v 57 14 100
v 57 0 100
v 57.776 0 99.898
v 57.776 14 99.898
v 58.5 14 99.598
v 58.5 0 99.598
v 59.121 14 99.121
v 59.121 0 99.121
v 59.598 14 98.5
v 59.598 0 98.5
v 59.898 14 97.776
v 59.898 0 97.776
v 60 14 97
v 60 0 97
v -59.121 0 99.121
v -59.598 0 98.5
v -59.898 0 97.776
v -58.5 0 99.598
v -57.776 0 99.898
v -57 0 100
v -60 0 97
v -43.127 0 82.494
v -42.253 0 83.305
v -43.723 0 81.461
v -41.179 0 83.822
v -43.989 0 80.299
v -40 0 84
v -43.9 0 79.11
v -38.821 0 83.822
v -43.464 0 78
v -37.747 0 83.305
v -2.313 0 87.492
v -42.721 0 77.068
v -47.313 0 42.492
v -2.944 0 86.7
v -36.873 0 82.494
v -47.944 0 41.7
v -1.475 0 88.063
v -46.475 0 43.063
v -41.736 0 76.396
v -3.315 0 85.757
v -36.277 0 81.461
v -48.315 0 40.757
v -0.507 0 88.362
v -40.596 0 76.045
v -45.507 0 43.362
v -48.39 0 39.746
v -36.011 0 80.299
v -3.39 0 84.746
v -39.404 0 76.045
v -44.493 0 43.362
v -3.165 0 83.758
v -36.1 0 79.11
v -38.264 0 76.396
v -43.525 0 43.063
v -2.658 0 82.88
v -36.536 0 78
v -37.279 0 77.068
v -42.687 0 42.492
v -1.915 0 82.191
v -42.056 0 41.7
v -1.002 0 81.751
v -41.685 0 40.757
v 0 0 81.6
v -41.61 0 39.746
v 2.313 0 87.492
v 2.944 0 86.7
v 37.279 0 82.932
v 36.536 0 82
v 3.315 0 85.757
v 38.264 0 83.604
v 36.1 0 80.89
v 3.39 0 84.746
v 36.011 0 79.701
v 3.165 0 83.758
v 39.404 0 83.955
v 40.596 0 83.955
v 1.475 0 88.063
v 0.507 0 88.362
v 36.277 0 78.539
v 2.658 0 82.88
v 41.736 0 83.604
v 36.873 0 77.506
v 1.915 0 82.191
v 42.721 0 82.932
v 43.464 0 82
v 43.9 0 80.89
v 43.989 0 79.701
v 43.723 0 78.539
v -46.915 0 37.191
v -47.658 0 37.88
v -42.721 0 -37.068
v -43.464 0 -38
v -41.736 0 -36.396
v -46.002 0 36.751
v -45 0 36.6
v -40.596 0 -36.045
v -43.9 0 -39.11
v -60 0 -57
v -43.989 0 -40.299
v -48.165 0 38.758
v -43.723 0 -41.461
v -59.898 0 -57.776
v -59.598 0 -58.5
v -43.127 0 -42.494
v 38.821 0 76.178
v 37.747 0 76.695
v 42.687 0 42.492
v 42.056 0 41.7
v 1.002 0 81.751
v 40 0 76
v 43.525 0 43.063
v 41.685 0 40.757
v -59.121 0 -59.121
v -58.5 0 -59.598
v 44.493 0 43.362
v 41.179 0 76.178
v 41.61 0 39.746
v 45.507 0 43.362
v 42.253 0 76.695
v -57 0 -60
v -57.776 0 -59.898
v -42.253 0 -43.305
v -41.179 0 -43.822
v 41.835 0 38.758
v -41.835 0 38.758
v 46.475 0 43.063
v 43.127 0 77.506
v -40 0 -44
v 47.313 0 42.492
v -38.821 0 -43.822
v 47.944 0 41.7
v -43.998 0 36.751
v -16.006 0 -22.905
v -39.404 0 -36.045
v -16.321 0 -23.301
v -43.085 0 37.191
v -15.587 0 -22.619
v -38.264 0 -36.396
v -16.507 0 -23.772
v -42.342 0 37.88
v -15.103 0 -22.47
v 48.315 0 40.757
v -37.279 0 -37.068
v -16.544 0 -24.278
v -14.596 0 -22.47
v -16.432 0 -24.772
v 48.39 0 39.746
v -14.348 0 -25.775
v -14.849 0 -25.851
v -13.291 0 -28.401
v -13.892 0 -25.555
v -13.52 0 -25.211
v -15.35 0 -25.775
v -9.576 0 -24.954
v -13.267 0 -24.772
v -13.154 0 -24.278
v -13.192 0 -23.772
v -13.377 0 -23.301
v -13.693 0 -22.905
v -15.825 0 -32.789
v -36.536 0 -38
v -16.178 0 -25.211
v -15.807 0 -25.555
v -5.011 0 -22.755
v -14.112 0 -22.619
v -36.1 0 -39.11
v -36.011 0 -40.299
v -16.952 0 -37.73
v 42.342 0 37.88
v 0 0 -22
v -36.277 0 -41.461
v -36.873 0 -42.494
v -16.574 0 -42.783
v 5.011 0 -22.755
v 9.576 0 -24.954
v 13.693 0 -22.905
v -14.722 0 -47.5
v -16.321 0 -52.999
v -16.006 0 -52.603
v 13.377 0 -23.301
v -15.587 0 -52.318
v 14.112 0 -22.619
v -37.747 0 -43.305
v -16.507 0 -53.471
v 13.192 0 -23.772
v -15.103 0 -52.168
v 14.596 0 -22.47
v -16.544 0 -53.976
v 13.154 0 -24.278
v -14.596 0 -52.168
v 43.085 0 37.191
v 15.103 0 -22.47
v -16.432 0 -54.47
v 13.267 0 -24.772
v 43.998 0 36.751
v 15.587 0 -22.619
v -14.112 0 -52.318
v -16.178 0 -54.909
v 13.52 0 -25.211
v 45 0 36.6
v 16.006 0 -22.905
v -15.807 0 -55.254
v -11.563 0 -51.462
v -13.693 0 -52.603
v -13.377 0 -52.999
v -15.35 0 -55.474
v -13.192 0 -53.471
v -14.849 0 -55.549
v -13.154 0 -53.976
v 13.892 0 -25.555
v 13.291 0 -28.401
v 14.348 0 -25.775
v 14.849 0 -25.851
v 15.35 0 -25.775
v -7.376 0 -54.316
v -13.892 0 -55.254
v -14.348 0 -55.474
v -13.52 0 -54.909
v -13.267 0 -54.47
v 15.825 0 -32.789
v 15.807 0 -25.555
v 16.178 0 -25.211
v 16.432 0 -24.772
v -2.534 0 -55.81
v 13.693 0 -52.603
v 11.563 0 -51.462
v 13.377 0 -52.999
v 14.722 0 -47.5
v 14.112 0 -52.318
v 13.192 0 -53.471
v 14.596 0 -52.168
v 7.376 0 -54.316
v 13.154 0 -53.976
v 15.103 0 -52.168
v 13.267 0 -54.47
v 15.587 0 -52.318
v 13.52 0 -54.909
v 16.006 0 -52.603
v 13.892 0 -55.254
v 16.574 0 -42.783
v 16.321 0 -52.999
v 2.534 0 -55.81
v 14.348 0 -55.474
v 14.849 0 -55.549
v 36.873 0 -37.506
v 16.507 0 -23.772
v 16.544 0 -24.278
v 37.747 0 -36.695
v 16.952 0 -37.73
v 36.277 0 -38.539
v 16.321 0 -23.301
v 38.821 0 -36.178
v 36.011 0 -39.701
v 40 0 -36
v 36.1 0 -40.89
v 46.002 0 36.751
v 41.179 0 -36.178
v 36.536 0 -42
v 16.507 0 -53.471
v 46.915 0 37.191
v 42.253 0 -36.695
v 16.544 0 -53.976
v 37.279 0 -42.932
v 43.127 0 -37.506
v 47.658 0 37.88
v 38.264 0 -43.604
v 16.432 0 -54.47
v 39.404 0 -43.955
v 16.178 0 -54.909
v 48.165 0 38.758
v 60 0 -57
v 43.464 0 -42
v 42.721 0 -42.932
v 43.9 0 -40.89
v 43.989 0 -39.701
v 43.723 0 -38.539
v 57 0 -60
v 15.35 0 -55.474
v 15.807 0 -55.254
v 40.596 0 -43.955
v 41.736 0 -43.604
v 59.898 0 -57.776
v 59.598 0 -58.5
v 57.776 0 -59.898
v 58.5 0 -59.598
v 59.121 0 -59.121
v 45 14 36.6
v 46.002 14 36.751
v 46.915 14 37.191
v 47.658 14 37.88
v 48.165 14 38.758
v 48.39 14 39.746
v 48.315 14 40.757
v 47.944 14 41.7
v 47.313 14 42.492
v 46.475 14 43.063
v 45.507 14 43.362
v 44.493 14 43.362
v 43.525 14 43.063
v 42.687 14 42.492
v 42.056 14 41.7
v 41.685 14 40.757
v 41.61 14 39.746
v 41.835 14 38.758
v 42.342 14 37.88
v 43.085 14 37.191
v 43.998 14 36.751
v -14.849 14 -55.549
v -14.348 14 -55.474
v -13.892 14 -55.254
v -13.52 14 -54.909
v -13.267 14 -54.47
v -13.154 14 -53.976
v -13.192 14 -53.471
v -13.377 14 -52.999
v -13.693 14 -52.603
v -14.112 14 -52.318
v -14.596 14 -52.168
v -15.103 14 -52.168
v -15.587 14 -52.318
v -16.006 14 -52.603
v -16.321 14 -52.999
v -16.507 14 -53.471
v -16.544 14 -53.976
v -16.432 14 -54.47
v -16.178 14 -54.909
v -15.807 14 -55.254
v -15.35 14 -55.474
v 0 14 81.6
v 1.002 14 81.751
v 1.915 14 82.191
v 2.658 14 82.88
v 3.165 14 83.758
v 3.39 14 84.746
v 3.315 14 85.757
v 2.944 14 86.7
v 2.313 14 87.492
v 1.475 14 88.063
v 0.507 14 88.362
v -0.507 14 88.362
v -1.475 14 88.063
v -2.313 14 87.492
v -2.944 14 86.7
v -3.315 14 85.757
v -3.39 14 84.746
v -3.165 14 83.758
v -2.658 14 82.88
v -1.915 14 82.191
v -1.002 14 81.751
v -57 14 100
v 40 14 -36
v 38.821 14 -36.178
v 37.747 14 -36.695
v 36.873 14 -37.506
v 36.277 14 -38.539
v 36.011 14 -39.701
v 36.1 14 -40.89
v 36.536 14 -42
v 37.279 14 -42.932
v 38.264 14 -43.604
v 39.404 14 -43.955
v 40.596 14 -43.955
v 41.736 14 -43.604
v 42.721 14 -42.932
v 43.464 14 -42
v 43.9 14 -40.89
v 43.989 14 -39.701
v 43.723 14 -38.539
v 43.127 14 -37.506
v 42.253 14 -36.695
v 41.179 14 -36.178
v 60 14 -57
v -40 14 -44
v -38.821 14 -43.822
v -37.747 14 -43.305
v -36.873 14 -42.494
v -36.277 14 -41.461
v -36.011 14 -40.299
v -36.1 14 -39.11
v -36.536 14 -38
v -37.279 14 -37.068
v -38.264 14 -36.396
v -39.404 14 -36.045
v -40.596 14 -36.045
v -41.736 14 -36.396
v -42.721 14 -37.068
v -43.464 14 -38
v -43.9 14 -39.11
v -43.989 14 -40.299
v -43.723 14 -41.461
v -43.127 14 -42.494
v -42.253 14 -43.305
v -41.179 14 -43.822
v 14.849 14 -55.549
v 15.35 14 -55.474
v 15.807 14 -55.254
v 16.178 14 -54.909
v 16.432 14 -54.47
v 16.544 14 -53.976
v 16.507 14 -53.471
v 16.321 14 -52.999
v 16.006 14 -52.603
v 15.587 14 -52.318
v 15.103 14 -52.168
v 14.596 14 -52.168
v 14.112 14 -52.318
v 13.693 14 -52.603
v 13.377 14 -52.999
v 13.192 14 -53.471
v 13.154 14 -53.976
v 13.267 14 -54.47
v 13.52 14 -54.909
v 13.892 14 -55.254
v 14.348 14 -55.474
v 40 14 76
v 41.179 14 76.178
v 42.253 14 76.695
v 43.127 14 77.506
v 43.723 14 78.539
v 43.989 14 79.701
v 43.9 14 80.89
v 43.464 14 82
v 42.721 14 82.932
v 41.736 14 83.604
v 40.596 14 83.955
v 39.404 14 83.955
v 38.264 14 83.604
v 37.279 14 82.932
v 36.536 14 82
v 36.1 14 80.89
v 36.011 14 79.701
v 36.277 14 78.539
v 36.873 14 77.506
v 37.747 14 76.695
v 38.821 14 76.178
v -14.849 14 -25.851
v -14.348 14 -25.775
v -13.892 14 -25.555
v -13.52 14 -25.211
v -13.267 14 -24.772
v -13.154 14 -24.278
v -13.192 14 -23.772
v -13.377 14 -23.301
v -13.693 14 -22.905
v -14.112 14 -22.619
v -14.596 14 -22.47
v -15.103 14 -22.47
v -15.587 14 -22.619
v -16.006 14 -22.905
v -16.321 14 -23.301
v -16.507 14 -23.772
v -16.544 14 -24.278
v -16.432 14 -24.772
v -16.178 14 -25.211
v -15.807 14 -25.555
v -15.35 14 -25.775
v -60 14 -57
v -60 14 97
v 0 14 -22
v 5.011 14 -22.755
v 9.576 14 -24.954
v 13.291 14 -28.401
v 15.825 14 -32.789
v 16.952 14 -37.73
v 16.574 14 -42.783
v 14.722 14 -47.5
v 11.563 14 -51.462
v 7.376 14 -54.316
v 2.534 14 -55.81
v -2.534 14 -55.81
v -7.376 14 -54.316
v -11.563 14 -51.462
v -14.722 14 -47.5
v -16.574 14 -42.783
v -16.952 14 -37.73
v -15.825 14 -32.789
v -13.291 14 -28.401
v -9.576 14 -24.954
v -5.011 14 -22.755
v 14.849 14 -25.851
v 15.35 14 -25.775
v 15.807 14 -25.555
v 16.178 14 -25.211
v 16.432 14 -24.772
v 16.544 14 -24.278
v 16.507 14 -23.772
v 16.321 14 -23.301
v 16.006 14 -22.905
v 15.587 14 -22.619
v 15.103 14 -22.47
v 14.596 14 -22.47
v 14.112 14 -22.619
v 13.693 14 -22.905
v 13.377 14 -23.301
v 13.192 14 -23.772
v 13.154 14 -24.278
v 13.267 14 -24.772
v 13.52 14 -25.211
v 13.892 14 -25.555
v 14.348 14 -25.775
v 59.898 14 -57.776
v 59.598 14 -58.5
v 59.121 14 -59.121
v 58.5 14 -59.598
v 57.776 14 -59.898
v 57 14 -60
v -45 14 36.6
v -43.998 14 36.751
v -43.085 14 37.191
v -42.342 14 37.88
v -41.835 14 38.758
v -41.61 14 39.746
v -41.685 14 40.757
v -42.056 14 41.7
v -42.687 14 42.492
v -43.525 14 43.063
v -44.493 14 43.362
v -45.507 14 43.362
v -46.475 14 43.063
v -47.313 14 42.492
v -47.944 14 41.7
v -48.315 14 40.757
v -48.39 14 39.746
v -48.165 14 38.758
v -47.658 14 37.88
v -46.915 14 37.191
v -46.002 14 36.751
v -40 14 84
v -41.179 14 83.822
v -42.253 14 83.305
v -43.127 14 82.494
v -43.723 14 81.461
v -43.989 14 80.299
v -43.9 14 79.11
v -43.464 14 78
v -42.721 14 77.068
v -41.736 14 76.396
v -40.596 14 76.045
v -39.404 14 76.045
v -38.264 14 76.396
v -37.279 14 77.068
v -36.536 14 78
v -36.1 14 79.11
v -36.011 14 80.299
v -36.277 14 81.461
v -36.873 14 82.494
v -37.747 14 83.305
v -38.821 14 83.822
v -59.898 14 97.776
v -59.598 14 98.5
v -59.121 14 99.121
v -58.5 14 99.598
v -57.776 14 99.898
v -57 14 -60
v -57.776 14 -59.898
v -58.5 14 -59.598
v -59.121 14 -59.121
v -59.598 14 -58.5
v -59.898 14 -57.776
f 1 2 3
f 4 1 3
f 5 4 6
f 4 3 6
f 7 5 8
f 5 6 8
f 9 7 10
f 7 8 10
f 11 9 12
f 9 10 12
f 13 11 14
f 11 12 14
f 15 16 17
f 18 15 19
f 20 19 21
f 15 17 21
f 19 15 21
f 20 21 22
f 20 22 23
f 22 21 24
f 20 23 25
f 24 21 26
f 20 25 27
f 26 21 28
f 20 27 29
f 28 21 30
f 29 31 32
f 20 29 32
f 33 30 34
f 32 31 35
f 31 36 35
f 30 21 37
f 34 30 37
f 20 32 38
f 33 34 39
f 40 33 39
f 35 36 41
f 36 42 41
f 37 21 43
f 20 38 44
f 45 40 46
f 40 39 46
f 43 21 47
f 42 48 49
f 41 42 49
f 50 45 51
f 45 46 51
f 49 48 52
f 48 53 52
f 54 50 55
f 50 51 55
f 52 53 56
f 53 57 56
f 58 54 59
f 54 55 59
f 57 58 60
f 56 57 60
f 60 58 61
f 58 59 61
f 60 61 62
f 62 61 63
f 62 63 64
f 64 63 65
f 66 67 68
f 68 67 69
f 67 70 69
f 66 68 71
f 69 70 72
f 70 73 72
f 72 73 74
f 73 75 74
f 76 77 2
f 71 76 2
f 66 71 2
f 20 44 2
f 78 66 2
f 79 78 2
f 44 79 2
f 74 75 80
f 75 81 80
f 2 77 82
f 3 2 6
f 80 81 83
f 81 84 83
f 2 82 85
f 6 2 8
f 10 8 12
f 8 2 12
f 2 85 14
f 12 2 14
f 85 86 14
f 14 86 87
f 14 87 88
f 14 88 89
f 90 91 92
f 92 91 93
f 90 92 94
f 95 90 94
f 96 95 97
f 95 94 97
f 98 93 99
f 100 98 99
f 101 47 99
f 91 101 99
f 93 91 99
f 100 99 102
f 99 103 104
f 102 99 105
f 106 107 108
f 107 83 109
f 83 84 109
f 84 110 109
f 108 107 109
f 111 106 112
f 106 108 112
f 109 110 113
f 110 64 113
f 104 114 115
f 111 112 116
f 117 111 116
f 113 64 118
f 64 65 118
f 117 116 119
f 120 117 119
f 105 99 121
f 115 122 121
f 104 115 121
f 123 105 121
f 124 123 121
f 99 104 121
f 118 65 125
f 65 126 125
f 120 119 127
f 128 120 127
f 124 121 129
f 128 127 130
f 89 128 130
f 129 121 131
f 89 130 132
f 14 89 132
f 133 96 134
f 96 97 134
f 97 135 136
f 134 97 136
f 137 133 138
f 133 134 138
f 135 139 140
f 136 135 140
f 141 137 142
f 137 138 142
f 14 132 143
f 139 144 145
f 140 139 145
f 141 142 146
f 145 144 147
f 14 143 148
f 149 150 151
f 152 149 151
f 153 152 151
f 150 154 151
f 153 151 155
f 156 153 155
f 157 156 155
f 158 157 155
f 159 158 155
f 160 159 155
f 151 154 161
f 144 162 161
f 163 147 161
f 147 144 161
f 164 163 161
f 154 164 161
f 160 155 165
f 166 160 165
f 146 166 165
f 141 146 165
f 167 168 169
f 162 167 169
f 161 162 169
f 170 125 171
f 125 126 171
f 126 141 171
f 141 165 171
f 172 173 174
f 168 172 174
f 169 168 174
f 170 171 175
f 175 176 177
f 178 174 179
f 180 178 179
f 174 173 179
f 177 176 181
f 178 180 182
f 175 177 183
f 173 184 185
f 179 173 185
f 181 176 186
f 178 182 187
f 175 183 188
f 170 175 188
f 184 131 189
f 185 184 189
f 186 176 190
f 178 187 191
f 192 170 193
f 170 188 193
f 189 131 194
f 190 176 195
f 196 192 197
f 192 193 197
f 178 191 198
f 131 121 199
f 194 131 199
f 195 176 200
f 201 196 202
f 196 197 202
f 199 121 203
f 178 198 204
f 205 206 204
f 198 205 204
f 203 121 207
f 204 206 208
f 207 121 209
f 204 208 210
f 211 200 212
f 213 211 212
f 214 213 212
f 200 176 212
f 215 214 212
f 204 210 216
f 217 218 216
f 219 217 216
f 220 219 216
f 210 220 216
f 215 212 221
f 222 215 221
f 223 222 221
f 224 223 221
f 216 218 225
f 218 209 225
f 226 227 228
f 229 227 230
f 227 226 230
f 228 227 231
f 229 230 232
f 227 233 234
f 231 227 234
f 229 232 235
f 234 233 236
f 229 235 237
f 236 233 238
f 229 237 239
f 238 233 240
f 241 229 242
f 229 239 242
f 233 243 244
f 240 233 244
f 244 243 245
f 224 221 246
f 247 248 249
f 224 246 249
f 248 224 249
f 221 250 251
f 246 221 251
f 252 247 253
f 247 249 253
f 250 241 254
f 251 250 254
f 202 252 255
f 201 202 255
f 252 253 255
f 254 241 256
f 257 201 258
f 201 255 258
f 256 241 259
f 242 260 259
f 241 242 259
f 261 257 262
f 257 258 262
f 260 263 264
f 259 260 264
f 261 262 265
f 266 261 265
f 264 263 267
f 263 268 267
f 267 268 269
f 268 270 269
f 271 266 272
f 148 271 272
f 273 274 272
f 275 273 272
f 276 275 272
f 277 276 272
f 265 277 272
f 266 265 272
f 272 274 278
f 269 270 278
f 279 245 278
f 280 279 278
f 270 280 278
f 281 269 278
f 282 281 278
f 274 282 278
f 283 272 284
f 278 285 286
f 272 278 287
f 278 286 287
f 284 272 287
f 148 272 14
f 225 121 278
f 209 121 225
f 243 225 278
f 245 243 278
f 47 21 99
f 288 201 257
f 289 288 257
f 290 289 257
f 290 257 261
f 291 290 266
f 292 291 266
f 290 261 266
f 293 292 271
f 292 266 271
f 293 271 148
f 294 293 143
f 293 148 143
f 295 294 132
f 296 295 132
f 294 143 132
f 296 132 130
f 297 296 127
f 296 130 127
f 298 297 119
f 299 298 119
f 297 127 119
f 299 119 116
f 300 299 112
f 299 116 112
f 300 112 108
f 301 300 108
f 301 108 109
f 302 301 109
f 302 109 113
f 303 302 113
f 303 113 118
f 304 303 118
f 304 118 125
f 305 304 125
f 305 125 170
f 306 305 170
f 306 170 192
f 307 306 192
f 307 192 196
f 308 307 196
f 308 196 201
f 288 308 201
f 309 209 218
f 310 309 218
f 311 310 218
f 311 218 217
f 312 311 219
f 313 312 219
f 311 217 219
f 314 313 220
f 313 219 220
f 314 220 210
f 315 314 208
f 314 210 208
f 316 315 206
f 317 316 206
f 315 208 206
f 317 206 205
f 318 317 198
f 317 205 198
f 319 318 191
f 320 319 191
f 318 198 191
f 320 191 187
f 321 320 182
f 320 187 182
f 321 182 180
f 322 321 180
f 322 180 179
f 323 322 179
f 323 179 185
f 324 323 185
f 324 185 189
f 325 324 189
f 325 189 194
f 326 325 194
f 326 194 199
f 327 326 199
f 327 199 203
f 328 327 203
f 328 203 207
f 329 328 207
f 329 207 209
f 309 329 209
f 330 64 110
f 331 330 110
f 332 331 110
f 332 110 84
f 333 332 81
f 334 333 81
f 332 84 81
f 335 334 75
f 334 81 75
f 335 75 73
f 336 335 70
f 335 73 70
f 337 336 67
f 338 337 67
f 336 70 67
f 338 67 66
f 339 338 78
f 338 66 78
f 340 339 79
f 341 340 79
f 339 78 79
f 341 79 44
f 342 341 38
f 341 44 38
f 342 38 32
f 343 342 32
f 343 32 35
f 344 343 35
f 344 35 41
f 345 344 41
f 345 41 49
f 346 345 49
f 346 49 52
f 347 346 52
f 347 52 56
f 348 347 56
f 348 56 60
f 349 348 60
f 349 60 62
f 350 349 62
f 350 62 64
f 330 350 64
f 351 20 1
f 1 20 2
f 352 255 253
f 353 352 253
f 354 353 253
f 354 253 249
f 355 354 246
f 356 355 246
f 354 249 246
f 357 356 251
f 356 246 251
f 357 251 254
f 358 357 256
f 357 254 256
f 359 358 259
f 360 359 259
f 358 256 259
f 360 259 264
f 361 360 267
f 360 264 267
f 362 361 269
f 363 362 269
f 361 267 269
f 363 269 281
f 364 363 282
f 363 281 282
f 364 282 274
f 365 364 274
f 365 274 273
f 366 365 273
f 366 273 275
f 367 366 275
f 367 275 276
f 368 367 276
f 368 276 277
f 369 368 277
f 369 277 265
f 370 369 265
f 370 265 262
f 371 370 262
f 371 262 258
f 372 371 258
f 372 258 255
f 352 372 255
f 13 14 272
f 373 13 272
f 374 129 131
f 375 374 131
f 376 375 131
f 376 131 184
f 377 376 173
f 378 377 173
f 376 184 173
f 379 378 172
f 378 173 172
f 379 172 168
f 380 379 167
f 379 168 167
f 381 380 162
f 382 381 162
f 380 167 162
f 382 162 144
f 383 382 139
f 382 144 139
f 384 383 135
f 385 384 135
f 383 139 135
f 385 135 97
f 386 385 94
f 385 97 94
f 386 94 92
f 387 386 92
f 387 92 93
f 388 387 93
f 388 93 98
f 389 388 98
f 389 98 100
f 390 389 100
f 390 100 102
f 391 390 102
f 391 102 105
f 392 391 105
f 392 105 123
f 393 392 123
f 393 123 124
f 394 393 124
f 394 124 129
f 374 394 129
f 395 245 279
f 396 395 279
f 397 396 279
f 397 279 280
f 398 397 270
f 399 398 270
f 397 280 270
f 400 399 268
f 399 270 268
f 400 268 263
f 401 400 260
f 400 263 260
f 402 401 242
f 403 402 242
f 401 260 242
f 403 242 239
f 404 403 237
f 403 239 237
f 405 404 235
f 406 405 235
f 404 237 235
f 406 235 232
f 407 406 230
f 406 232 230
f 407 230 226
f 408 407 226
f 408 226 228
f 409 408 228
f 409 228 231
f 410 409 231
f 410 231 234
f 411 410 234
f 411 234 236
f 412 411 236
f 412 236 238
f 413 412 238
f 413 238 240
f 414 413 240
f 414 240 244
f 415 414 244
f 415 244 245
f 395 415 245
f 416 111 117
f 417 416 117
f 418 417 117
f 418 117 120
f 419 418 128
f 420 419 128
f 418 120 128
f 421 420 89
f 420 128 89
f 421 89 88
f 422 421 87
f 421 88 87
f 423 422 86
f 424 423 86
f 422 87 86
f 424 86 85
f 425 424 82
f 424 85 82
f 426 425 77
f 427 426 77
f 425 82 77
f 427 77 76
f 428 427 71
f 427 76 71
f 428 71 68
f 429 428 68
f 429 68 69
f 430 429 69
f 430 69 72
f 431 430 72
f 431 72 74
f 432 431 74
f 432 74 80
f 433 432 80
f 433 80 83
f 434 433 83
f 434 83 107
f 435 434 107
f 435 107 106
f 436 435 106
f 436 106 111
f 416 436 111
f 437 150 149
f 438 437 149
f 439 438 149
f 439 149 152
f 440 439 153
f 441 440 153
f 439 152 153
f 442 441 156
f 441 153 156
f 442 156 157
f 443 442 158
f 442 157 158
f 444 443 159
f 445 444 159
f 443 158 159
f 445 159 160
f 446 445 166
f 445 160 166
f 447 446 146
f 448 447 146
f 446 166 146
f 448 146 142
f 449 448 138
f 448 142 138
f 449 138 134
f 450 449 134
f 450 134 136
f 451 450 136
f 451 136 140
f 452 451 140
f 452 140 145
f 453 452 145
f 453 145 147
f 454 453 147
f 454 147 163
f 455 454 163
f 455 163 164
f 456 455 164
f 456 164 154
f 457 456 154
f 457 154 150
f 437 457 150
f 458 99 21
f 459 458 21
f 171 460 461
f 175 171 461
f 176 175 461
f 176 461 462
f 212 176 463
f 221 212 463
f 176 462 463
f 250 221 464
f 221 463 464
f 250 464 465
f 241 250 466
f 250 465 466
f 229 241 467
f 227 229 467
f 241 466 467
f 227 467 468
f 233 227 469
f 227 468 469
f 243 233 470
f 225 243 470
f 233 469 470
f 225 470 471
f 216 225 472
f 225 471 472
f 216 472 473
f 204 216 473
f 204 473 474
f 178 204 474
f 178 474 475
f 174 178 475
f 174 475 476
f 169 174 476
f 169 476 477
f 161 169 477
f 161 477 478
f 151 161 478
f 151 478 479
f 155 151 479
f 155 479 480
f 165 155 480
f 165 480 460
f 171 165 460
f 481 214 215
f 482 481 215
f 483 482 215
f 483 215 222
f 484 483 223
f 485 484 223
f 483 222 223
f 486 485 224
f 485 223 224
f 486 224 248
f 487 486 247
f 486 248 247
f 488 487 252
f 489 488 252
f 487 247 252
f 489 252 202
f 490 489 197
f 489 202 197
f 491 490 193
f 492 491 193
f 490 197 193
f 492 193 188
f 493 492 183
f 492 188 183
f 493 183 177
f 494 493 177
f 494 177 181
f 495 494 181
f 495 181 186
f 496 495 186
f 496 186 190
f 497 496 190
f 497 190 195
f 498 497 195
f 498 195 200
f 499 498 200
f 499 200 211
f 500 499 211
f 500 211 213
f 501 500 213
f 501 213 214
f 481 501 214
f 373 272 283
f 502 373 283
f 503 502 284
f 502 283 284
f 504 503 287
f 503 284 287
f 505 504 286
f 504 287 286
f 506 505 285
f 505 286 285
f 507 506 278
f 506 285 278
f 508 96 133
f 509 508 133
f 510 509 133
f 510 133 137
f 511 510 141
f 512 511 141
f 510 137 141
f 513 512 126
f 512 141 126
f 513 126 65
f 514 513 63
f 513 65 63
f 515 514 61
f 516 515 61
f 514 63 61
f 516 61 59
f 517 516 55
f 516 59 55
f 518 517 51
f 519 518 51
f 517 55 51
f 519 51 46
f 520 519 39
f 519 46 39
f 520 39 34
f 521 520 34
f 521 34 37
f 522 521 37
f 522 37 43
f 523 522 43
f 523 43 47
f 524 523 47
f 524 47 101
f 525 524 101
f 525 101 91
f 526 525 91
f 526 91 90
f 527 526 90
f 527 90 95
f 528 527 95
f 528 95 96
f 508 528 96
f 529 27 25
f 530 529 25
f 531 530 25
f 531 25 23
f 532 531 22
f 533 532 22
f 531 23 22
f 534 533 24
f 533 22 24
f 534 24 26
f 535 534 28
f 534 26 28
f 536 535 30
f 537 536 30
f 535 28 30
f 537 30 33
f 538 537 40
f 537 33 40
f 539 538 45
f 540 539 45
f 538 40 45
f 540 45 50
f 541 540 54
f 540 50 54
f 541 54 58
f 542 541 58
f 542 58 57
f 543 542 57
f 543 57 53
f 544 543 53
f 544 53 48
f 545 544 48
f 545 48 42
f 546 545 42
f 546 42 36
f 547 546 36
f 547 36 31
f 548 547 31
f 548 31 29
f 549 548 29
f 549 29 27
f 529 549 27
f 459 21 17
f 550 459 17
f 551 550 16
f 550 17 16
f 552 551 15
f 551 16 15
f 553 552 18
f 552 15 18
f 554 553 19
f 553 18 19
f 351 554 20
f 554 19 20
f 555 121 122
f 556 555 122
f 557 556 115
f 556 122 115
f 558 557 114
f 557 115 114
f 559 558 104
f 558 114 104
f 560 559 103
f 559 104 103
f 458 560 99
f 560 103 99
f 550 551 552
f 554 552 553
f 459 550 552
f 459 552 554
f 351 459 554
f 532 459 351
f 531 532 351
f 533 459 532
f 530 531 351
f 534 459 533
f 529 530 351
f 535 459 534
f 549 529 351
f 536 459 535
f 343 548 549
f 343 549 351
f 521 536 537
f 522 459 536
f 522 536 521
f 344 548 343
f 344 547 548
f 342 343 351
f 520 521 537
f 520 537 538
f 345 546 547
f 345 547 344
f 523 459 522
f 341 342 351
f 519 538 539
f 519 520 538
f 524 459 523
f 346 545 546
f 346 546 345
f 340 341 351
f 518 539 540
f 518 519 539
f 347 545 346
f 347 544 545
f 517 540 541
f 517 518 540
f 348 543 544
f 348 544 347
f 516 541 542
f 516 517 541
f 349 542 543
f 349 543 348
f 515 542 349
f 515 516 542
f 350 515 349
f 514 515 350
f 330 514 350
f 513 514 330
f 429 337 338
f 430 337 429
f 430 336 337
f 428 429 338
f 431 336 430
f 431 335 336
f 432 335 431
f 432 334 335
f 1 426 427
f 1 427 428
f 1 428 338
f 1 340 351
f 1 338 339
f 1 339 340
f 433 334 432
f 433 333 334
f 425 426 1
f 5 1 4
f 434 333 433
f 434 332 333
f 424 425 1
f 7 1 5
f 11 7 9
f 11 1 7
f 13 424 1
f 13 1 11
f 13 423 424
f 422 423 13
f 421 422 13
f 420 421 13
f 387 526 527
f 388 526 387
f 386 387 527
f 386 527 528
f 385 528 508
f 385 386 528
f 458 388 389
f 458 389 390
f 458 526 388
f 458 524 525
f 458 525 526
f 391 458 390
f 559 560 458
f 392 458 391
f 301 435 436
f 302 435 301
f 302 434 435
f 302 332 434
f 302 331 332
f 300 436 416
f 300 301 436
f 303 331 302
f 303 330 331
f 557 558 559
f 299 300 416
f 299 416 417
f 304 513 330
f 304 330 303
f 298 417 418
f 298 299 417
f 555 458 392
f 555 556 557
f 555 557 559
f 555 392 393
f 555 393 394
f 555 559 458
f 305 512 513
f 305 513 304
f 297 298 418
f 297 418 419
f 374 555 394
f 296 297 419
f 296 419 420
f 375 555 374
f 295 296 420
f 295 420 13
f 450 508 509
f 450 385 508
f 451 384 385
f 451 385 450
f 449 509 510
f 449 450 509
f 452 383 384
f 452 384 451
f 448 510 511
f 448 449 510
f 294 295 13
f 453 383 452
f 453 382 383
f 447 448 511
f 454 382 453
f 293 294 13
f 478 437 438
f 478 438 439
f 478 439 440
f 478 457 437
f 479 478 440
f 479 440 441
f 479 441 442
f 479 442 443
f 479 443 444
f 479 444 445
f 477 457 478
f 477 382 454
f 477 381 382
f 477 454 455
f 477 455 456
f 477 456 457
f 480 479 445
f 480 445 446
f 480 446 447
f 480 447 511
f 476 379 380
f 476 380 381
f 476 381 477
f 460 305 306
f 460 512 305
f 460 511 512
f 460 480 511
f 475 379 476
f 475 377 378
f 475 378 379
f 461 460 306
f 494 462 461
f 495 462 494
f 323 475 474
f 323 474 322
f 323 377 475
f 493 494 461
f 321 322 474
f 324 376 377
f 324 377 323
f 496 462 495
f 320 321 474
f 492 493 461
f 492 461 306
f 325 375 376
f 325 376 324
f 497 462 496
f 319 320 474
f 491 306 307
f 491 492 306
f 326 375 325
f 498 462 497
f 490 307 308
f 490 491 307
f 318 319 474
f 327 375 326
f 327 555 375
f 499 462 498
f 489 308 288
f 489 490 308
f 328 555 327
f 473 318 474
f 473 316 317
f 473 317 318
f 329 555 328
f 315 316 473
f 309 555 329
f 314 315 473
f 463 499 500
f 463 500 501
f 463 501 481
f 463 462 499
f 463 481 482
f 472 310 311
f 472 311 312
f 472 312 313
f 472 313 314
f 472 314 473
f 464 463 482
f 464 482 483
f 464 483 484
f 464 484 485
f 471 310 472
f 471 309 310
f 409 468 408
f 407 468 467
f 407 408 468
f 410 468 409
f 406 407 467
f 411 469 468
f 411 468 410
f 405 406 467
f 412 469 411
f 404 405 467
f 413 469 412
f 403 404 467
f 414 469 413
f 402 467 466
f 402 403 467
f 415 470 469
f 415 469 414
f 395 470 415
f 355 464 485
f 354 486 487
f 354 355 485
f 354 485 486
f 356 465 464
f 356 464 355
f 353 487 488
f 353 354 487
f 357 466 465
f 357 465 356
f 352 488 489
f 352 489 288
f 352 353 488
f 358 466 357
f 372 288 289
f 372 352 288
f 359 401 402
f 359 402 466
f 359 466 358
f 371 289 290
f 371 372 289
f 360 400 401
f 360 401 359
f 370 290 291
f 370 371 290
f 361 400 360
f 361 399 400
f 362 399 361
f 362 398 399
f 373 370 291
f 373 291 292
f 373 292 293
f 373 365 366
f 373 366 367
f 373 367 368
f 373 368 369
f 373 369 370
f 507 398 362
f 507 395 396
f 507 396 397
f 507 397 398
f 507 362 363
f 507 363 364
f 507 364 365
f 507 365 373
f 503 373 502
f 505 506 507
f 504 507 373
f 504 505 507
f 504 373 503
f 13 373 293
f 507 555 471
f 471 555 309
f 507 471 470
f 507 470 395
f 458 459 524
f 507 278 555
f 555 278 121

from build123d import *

# Parameters (mm, degrees)
EXTRUDE_1_DEPTH     = 14
SKETCH_3_R          = 1.7
CUT_EXTRUDE_1_DEPTH = 118.45637488
SKETCH_4_R          = 3.4
CUT_EXTRUDE_2_DEPTH = 118.45637488
SKETCH_5_R          = 16.999999997
CUT_EXTRUDE_3_DEPTH = 118.45637488
SKETCH_6_R          = 4
CUT_EXTRUDE_4_DEPTH = 118.45637488


with BuildPart() as part:
    # 草图1 → 凸台-拉伸1 (new body)
    with BuildSketch(Plane(origin=(0, 0, 0), x_dir=(1, 0, 0), z_dir=(0, 1, 0))):
        with BuildLine():
            Line((-57, -100), (57, -100))
            ThreePointArc((57, -100), (59.121320344, -99.121320344), (60, -97))
            Line((60, -97), (60, 57))
            ThreePointArc((60, 57), (59.121320344, 59.121320344), (57, 60))
            Line((57, 60), (-57, 60))
            ThreePointArc((-57, 60), (-59.121320344, 59.121320344), (-60, 57))
            Line((-60, 57), (-60, -97))
            ThreePointArc((-60, -97), (-59.121320344, -99.121320344), (-57, -100))
        make_face()
    extrude(amount=EXTRUDE_1_DEPTH)

    # 草图3 → 切除-拉伸1 (cut, through all)
    with BuildSketch(Plane.XZ):
        with Locations(Location((14.849242405, -24.150757595, 0), (0, 0, 270))):
            Circle(SKETCH_3_R)
        with Locations(Location((14.849242405, -53.849242405, 0), (0, 0, 270))):
            Circle(SKETCH_3_R)
        with Locations(Location((-14.849242405, -53.849242405, 0), (0, 0, 270))):
            Circle(SKETCH_3_R)
        with Locations(Location((-14.849242405, -24.150757595, 0), (0, 0, 270))):
            Circle(SKETCH_3_R)
    extrude(amount=-CUT_EXTRUDE_1_DEPTH, mode=Mode.SUBTRACT)

    # 草图4 → 切除-拉伸2 (cut, through all)
    with BuildSketch(Plane.XZ):
        with Locations(Location((0, 85, 0), (0, 0, 270))):
            Circle(SKETCH_4_R)
        with Locations(Location((45, 40, 0), (0, 0, 270))):
            Circle(SKETCH_4_R)
        with Locations(Location((-45, 40, 0), (0, 0, 270))):
            Circle(SKETCH_4_R)
    extrude(amount=-CUT_EXTRUDE_2_DEPTH, mode=Mode.SUBTRACT)

    # 草图5 → 切除-拉伸3 (cut, through all)
    with BuildSketch(Plane(origin=(0, 14, 0), x_dir=(1, 0, 0), z_dir=(0, 1, 0))):
        with Locations(Location((4e-09, 38.999999996, 0), (0, 0, 270))):
            Circle(SKETCH_5_R)
    extrude(amount=-CUT_EXTRUDE_3_DEPTH, mode=Mode.SUBTRACT)

    # 草图6 → 切除-拉伸4 (cut, through all)
    with BuildSketch(Plane.XZ):
        with Locations(Location((40, 80, 0), (0, 0, 270))):
            Circle(SKETCH_6_R)
        with Locations(Location((-40, 80, 0), (0, 0, 90))):
            Circle(SKETCH_6_R)
        with Locations(Location((40, -40, 0), (0, 0, 90))):
            Circle(SKETCH_6_R)
        with Locations(Location((-40, -40, 0), (0, 0, 270))):
            Circle(SKETCH_6_R)
    extrude(amount=-CUT_EXTRUDE_4_DEPTH, mode=Mode.SUBTRACT)


solid = part.part
